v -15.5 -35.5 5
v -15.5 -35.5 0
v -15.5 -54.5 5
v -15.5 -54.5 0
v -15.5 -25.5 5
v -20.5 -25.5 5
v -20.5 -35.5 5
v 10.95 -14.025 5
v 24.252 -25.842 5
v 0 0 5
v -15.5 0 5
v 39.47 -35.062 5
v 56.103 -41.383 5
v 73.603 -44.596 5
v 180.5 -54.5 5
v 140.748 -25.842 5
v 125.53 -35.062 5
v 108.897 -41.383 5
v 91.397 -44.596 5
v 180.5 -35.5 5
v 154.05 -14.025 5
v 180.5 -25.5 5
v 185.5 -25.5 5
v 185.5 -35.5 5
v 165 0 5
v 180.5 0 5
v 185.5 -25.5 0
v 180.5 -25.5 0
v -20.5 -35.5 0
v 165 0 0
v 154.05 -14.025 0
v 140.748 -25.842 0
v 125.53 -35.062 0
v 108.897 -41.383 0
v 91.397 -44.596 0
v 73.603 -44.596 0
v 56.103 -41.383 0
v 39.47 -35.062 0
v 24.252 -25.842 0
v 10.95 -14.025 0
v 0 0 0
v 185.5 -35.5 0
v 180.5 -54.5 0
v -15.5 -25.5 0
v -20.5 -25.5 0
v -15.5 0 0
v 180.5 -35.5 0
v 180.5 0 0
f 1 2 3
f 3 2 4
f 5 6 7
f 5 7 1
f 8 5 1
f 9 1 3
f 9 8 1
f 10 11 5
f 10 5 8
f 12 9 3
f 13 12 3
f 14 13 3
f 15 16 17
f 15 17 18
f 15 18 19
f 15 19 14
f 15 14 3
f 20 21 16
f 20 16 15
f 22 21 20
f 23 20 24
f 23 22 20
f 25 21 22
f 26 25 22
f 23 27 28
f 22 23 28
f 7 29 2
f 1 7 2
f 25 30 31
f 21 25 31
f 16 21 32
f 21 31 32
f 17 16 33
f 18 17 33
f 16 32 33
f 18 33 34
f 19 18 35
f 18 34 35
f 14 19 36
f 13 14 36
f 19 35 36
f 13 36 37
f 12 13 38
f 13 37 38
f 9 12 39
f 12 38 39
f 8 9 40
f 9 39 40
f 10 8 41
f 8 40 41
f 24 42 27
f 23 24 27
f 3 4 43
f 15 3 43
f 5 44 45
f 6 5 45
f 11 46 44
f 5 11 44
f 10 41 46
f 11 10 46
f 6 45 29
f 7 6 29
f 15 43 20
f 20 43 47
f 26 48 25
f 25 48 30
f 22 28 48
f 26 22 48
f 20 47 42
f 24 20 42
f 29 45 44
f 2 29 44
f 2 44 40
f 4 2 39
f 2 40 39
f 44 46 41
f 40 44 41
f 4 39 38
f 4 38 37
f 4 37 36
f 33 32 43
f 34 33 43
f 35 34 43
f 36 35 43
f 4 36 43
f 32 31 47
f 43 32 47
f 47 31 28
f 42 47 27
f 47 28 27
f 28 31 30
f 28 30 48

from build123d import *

# Parameters (mm, degrees)
BOSS_EXTRU_1_DEPTH = 5


with BuildPart() as part:
    # Esquisse1 → Boss.-Extru.1 (new body)
    with BuildSketch(Plane.XY):
        with BuildLine():
            Line((0, 0), (-15.5, 0))
            Line((-15.5, 0), (-15.5, -25.5))
            Line((-15.5, -25.5), (-20.5, -25.5))
            Line((-20.5, -25.5), (-20.5, -35.5))
            Line((-20.5, -35.5), (-15.5, -35.5))
            Line((-15.5, -35.5), (-15.5, -54.5))
            Line((-15.5, -54.5), (180.5, -54.5))
            Line((180.5, -54.5), (180.5, -35.5))
            Line((180.5, -35.5), (185.5, -35.5))
            Line((185.5, -35.5), (185.5, -25.5))
            Line((185.5, -25.5), (180.5, -25.5))
            Line((180.5, -25.5), (180.5, 0))
            Line((180.5, 0), (165, 0))
            ThreePointArc((165, 0), (82.5, -45), (0, 0))
        make_face()
    extrude(amount=BOSS_EXTRU_1_DEPTH)


solid = part.part
